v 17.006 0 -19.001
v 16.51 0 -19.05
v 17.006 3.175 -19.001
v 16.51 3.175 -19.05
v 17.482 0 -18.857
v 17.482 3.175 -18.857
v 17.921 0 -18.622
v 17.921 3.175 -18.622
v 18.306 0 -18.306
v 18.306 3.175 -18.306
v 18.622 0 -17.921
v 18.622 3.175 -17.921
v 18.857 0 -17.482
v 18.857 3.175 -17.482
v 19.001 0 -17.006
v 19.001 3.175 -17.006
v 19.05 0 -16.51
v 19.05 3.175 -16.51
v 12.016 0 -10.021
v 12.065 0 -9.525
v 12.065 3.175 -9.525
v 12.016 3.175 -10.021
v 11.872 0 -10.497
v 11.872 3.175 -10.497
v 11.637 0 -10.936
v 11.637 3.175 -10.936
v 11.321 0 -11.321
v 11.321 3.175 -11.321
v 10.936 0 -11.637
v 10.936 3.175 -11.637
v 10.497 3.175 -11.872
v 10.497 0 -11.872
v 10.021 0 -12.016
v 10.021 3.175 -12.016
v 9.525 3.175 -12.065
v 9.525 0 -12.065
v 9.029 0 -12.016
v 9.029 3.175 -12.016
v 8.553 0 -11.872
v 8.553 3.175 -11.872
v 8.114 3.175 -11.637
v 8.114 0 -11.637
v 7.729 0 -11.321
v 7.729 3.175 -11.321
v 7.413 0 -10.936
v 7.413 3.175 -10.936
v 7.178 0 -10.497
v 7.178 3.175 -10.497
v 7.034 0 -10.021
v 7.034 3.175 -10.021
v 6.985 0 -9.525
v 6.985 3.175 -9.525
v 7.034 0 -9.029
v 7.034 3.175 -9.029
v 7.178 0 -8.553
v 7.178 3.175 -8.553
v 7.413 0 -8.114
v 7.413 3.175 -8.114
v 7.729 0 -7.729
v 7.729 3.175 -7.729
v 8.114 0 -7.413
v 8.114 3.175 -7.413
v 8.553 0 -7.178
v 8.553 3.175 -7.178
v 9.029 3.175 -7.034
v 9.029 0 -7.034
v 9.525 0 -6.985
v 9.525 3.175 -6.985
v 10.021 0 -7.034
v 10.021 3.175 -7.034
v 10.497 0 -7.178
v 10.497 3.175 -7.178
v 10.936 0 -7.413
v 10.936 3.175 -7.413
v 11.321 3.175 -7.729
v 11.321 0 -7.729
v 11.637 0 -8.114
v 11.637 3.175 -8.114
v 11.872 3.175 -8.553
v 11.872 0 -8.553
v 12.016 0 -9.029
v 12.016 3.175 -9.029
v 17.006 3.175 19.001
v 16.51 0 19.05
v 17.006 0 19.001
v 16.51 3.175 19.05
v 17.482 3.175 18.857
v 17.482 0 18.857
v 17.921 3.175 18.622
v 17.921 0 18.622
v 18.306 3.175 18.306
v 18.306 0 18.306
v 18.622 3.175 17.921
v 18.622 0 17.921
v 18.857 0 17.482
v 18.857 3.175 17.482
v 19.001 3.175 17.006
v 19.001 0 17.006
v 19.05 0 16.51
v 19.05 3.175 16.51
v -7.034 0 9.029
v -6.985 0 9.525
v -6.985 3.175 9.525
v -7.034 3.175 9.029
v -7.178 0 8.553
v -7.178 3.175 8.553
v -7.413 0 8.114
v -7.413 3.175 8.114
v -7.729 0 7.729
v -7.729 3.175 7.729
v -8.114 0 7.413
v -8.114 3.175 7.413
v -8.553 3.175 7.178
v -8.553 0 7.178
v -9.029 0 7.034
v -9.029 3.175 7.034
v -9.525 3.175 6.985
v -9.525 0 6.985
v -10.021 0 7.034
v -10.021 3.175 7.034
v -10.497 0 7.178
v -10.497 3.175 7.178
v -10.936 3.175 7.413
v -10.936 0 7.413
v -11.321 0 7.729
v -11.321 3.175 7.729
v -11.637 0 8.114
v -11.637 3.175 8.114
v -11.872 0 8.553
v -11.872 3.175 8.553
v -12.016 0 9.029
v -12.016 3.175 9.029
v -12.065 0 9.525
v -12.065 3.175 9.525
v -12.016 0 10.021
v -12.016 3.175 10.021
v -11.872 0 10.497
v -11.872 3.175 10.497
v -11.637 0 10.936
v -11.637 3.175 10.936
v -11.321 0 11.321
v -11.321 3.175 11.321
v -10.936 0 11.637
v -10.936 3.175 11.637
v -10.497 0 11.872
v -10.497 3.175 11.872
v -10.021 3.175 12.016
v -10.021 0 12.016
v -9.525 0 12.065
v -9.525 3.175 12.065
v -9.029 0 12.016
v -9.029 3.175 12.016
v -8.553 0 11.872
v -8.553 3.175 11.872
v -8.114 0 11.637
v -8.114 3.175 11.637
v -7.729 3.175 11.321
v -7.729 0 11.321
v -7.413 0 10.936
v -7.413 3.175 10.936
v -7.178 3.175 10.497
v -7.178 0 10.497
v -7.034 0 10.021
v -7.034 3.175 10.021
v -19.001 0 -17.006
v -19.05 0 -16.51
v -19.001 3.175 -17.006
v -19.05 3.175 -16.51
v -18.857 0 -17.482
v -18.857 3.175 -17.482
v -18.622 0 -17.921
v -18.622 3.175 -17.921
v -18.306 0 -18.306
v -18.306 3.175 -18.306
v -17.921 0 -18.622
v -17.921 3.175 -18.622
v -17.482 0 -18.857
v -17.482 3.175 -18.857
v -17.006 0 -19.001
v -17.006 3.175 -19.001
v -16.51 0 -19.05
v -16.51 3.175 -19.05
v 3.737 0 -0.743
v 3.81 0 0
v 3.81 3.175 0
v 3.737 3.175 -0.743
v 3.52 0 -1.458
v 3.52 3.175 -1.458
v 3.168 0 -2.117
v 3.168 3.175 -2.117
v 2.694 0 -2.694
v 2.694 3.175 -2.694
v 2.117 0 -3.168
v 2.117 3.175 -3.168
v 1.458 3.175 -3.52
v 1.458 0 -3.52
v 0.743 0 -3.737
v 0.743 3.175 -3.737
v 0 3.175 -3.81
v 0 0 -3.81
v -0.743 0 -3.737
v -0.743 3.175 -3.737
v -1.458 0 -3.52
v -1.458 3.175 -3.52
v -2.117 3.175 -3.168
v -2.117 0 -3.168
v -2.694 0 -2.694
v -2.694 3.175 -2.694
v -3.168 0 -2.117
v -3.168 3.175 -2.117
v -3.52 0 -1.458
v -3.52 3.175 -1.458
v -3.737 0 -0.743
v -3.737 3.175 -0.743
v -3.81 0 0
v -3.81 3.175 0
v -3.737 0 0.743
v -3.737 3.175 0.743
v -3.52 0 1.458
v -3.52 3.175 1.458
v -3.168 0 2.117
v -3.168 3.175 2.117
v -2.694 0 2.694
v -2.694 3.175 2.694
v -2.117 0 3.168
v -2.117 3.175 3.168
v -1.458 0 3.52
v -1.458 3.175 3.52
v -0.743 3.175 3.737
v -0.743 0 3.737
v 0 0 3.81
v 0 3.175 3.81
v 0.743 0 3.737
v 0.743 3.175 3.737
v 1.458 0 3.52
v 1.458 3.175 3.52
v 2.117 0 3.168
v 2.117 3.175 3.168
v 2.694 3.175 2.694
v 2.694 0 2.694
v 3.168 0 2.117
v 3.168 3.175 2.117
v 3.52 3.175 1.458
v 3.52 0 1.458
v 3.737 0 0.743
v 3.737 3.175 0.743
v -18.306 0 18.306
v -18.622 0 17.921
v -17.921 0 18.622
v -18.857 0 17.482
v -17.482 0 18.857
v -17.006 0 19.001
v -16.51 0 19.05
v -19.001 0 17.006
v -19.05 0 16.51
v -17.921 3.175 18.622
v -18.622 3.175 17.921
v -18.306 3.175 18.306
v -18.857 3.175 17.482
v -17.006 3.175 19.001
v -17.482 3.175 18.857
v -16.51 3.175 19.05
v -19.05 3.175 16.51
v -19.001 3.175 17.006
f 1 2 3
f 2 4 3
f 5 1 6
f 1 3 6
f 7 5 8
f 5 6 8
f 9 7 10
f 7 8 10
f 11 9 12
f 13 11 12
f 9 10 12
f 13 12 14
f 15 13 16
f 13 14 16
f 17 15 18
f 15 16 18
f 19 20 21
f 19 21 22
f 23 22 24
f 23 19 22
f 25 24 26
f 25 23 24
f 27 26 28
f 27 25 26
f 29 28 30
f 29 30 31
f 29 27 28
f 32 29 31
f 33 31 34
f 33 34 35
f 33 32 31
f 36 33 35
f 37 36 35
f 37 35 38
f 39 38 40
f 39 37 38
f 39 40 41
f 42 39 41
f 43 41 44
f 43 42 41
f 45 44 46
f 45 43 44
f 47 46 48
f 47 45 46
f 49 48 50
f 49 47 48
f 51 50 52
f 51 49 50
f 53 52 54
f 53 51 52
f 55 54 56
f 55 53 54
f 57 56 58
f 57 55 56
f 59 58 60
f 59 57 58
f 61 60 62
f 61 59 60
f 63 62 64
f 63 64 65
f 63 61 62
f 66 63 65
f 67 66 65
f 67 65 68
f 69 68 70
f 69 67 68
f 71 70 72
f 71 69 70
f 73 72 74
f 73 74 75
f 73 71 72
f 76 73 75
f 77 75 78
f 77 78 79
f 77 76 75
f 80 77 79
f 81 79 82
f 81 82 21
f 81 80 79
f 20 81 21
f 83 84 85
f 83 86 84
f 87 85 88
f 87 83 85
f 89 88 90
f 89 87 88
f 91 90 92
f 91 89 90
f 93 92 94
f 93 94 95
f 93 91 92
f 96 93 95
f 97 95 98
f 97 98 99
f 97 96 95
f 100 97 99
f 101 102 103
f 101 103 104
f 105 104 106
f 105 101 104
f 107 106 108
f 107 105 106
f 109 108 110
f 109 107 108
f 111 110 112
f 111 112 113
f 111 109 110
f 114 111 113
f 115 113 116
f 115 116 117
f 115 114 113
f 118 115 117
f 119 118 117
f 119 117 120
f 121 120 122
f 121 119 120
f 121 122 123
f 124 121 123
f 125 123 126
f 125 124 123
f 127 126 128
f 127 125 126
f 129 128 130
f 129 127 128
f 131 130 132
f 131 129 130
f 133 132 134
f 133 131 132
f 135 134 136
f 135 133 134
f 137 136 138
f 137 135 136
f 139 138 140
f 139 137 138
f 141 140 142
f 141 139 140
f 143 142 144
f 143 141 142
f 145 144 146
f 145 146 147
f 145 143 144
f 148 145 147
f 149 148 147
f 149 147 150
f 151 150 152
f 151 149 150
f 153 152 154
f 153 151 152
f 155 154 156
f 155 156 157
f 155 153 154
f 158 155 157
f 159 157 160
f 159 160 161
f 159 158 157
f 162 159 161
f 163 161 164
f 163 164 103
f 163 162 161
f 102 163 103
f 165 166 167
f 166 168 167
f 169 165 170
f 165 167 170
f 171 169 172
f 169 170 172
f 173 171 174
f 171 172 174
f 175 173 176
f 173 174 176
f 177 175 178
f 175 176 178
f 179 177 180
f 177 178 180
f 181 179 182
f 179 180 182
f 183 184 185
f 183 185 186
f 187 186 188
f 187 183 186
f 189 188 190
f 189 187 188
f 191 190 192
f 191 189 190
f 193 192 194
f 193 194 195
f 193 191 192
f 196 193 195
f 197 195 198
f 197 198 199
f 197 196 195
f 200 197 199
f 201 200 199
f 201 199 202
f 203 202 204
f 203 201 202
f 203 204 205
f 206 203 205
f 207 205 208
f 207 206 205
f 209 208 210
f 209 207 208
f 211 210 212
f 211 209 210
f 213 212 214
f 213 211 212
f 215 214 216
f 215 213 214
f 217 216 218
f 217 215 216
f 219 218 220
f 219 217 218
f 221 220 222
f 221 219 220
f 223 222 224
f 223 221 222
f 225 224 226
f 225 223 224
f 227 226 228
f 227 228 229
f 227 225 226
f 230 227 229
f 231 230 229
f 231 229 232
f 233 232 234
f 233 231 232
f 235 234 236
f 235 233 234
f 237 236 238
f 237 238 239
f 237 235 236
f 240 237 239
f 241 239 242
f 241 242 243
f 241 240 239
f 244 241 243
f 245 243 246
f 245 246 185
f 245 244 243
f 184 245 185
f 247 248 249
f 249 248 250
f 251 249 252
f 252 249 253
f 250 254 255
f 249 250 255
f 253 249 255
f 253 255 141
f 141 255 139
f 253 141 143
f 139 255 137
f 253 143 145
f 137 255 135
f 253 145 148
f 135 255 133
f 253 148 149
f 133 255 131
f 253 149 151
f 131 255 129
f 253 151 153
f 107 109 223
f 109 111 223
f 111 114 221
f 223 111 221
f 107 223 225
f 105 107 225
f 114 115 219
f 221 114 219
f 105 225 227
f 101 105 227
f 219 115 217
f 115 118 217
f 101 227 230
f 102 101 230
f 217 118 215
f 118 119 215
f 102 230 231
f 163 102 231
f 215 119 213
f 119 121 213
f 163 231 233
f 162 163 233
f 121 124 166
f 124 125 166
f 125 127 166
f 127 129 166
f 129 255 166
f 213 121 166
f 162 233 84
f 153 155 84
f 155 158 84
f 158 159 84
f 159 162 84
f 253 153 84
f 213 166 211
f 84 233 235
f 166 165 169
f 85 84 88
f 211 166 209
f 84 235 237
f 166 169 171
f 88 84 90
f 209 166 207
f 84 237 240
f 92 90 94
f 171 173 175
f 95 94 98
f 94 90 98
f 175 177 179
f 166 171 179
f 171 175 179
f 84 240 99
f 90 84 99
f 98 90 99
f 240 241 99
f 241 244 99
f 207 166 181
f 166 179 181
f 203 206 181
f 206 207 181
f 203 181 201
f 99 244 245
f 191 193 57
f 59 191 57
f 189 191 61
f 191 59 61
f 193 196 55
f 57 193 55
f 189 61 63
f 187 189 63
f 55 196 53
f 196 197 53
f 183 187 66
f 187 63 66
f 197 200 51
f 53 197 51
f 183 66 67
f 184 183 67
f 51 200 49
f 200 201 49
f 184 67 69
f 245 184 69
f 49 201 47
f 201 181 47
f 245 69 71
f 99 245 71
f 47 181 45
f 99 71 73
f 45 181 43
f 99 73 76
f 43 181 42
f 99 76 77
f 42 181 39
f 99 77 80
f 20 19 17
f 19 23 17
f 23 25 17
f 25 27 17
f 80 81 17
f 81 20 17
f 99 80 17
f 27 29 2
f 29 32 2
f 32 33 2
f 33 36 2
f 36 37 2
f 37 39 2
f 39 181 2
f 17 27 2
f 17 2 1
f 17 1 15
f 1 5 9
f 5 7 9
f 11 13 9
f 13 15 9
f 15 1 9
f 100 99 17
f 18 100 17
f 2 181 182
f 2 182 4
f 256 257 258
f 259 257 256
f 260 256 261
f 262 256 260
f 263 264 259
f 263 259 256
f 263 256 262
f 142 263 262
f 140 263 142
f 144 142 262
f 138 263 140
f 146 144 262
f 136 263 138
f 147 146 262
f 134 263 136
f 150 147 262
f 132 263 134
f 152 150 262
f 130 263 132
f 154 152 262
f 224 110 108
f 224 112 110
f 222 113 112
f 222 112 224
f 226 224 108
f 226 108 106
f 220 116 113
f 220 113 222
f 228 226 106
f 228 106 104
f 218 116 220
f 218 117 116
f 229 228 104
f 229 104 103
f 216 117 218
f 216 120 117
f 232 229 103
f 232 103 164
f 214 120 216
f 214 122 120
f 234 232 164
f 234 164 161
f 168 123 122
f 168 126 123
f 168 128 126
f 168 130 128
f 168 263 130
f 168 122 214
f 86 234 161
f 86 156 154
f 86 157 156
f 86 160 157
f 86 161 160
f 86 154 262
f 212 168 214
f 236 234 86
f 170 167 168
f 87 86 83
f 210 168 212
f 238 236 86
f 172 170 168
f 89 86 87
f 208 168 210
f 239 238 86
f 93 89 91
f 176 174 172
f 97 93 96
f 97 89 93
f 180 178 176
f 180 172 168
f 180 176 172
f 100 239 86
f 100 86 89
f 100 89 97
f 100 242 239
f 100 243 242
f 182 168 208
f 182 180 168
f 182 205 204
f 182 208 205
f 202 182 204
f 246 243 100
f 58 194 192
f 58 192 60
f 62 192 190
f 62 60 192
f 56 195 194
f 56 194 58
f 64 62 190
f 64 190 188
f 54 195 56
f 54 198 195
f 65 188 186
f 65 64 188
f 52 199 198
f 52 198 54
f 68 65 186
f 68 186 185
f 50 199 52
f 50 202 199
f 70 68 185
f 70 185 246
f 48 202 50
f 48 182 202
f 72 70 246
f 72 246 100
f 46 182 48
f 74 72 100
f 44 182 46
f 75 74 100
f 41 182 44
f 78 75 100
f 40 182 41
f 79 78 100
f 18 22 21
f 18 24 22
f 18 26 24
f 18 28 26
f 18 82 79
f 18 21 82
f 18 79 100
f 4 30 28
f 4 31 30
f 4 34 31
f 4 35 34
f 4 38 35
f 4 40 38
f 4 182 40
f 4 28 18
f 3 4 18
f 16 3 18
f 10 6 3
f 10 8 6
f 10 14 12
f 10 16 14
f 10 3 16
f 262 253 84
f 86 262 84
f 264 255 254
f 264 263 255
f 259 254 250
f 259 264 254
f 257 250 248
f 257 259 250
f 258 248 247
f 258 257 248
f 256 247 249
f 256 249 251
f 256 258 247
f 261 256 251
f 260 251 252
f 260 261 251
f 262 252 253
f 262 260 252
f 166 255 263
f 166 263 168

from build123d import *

# Parameters (mm, degrees)
SKETCH1_W           = 38.1
SKETCH1_H           = 38.1
SKETCH1_R           = 2.54
SKETCH1_R_2         = 3.81
BOSS_EXTRUDE1_DEPTH = 3.175
FILLET1_R           = 2.54


with BuildPart() as part:
    # Sketch1 → Boss-Extrude1 (new body)
    with BuildSketch(Plane(origin=(0, 0, 0), x_dir=(1, 0, 0), z_dir=(0, 1, 0))):
        Rectangle(SKETCH1_W, SKETCH1_H)
        with Locations((9.525, 9.525)):
            Circle(SKETCH1_R, mode=Mode.SUBTRACT)
        with Locations((-9.525, -9.525)):
            Circle(SKETCH1_R, mode=Mode.SUBTRACT)
        Circle(SKETCH1_R_2, mode=Mode.SUBTRACT)
    extrude(amount=BOSS_EXTRUDE1_DEPTH)

    # Fillet1
    fillet1_edges = [part.edges().sort_by_distance(p)[0] for p in [
        (-19.05, 1.5875, -19.05),
        (19.05, 1.5875, -19.05),
        (19.05, 1.5875, 19.05),
        (-19.05, 1.5875, 19.05),
    ]]
    fillet(fillet1_edges, radius=FILLET1_R)


solid = part.part
